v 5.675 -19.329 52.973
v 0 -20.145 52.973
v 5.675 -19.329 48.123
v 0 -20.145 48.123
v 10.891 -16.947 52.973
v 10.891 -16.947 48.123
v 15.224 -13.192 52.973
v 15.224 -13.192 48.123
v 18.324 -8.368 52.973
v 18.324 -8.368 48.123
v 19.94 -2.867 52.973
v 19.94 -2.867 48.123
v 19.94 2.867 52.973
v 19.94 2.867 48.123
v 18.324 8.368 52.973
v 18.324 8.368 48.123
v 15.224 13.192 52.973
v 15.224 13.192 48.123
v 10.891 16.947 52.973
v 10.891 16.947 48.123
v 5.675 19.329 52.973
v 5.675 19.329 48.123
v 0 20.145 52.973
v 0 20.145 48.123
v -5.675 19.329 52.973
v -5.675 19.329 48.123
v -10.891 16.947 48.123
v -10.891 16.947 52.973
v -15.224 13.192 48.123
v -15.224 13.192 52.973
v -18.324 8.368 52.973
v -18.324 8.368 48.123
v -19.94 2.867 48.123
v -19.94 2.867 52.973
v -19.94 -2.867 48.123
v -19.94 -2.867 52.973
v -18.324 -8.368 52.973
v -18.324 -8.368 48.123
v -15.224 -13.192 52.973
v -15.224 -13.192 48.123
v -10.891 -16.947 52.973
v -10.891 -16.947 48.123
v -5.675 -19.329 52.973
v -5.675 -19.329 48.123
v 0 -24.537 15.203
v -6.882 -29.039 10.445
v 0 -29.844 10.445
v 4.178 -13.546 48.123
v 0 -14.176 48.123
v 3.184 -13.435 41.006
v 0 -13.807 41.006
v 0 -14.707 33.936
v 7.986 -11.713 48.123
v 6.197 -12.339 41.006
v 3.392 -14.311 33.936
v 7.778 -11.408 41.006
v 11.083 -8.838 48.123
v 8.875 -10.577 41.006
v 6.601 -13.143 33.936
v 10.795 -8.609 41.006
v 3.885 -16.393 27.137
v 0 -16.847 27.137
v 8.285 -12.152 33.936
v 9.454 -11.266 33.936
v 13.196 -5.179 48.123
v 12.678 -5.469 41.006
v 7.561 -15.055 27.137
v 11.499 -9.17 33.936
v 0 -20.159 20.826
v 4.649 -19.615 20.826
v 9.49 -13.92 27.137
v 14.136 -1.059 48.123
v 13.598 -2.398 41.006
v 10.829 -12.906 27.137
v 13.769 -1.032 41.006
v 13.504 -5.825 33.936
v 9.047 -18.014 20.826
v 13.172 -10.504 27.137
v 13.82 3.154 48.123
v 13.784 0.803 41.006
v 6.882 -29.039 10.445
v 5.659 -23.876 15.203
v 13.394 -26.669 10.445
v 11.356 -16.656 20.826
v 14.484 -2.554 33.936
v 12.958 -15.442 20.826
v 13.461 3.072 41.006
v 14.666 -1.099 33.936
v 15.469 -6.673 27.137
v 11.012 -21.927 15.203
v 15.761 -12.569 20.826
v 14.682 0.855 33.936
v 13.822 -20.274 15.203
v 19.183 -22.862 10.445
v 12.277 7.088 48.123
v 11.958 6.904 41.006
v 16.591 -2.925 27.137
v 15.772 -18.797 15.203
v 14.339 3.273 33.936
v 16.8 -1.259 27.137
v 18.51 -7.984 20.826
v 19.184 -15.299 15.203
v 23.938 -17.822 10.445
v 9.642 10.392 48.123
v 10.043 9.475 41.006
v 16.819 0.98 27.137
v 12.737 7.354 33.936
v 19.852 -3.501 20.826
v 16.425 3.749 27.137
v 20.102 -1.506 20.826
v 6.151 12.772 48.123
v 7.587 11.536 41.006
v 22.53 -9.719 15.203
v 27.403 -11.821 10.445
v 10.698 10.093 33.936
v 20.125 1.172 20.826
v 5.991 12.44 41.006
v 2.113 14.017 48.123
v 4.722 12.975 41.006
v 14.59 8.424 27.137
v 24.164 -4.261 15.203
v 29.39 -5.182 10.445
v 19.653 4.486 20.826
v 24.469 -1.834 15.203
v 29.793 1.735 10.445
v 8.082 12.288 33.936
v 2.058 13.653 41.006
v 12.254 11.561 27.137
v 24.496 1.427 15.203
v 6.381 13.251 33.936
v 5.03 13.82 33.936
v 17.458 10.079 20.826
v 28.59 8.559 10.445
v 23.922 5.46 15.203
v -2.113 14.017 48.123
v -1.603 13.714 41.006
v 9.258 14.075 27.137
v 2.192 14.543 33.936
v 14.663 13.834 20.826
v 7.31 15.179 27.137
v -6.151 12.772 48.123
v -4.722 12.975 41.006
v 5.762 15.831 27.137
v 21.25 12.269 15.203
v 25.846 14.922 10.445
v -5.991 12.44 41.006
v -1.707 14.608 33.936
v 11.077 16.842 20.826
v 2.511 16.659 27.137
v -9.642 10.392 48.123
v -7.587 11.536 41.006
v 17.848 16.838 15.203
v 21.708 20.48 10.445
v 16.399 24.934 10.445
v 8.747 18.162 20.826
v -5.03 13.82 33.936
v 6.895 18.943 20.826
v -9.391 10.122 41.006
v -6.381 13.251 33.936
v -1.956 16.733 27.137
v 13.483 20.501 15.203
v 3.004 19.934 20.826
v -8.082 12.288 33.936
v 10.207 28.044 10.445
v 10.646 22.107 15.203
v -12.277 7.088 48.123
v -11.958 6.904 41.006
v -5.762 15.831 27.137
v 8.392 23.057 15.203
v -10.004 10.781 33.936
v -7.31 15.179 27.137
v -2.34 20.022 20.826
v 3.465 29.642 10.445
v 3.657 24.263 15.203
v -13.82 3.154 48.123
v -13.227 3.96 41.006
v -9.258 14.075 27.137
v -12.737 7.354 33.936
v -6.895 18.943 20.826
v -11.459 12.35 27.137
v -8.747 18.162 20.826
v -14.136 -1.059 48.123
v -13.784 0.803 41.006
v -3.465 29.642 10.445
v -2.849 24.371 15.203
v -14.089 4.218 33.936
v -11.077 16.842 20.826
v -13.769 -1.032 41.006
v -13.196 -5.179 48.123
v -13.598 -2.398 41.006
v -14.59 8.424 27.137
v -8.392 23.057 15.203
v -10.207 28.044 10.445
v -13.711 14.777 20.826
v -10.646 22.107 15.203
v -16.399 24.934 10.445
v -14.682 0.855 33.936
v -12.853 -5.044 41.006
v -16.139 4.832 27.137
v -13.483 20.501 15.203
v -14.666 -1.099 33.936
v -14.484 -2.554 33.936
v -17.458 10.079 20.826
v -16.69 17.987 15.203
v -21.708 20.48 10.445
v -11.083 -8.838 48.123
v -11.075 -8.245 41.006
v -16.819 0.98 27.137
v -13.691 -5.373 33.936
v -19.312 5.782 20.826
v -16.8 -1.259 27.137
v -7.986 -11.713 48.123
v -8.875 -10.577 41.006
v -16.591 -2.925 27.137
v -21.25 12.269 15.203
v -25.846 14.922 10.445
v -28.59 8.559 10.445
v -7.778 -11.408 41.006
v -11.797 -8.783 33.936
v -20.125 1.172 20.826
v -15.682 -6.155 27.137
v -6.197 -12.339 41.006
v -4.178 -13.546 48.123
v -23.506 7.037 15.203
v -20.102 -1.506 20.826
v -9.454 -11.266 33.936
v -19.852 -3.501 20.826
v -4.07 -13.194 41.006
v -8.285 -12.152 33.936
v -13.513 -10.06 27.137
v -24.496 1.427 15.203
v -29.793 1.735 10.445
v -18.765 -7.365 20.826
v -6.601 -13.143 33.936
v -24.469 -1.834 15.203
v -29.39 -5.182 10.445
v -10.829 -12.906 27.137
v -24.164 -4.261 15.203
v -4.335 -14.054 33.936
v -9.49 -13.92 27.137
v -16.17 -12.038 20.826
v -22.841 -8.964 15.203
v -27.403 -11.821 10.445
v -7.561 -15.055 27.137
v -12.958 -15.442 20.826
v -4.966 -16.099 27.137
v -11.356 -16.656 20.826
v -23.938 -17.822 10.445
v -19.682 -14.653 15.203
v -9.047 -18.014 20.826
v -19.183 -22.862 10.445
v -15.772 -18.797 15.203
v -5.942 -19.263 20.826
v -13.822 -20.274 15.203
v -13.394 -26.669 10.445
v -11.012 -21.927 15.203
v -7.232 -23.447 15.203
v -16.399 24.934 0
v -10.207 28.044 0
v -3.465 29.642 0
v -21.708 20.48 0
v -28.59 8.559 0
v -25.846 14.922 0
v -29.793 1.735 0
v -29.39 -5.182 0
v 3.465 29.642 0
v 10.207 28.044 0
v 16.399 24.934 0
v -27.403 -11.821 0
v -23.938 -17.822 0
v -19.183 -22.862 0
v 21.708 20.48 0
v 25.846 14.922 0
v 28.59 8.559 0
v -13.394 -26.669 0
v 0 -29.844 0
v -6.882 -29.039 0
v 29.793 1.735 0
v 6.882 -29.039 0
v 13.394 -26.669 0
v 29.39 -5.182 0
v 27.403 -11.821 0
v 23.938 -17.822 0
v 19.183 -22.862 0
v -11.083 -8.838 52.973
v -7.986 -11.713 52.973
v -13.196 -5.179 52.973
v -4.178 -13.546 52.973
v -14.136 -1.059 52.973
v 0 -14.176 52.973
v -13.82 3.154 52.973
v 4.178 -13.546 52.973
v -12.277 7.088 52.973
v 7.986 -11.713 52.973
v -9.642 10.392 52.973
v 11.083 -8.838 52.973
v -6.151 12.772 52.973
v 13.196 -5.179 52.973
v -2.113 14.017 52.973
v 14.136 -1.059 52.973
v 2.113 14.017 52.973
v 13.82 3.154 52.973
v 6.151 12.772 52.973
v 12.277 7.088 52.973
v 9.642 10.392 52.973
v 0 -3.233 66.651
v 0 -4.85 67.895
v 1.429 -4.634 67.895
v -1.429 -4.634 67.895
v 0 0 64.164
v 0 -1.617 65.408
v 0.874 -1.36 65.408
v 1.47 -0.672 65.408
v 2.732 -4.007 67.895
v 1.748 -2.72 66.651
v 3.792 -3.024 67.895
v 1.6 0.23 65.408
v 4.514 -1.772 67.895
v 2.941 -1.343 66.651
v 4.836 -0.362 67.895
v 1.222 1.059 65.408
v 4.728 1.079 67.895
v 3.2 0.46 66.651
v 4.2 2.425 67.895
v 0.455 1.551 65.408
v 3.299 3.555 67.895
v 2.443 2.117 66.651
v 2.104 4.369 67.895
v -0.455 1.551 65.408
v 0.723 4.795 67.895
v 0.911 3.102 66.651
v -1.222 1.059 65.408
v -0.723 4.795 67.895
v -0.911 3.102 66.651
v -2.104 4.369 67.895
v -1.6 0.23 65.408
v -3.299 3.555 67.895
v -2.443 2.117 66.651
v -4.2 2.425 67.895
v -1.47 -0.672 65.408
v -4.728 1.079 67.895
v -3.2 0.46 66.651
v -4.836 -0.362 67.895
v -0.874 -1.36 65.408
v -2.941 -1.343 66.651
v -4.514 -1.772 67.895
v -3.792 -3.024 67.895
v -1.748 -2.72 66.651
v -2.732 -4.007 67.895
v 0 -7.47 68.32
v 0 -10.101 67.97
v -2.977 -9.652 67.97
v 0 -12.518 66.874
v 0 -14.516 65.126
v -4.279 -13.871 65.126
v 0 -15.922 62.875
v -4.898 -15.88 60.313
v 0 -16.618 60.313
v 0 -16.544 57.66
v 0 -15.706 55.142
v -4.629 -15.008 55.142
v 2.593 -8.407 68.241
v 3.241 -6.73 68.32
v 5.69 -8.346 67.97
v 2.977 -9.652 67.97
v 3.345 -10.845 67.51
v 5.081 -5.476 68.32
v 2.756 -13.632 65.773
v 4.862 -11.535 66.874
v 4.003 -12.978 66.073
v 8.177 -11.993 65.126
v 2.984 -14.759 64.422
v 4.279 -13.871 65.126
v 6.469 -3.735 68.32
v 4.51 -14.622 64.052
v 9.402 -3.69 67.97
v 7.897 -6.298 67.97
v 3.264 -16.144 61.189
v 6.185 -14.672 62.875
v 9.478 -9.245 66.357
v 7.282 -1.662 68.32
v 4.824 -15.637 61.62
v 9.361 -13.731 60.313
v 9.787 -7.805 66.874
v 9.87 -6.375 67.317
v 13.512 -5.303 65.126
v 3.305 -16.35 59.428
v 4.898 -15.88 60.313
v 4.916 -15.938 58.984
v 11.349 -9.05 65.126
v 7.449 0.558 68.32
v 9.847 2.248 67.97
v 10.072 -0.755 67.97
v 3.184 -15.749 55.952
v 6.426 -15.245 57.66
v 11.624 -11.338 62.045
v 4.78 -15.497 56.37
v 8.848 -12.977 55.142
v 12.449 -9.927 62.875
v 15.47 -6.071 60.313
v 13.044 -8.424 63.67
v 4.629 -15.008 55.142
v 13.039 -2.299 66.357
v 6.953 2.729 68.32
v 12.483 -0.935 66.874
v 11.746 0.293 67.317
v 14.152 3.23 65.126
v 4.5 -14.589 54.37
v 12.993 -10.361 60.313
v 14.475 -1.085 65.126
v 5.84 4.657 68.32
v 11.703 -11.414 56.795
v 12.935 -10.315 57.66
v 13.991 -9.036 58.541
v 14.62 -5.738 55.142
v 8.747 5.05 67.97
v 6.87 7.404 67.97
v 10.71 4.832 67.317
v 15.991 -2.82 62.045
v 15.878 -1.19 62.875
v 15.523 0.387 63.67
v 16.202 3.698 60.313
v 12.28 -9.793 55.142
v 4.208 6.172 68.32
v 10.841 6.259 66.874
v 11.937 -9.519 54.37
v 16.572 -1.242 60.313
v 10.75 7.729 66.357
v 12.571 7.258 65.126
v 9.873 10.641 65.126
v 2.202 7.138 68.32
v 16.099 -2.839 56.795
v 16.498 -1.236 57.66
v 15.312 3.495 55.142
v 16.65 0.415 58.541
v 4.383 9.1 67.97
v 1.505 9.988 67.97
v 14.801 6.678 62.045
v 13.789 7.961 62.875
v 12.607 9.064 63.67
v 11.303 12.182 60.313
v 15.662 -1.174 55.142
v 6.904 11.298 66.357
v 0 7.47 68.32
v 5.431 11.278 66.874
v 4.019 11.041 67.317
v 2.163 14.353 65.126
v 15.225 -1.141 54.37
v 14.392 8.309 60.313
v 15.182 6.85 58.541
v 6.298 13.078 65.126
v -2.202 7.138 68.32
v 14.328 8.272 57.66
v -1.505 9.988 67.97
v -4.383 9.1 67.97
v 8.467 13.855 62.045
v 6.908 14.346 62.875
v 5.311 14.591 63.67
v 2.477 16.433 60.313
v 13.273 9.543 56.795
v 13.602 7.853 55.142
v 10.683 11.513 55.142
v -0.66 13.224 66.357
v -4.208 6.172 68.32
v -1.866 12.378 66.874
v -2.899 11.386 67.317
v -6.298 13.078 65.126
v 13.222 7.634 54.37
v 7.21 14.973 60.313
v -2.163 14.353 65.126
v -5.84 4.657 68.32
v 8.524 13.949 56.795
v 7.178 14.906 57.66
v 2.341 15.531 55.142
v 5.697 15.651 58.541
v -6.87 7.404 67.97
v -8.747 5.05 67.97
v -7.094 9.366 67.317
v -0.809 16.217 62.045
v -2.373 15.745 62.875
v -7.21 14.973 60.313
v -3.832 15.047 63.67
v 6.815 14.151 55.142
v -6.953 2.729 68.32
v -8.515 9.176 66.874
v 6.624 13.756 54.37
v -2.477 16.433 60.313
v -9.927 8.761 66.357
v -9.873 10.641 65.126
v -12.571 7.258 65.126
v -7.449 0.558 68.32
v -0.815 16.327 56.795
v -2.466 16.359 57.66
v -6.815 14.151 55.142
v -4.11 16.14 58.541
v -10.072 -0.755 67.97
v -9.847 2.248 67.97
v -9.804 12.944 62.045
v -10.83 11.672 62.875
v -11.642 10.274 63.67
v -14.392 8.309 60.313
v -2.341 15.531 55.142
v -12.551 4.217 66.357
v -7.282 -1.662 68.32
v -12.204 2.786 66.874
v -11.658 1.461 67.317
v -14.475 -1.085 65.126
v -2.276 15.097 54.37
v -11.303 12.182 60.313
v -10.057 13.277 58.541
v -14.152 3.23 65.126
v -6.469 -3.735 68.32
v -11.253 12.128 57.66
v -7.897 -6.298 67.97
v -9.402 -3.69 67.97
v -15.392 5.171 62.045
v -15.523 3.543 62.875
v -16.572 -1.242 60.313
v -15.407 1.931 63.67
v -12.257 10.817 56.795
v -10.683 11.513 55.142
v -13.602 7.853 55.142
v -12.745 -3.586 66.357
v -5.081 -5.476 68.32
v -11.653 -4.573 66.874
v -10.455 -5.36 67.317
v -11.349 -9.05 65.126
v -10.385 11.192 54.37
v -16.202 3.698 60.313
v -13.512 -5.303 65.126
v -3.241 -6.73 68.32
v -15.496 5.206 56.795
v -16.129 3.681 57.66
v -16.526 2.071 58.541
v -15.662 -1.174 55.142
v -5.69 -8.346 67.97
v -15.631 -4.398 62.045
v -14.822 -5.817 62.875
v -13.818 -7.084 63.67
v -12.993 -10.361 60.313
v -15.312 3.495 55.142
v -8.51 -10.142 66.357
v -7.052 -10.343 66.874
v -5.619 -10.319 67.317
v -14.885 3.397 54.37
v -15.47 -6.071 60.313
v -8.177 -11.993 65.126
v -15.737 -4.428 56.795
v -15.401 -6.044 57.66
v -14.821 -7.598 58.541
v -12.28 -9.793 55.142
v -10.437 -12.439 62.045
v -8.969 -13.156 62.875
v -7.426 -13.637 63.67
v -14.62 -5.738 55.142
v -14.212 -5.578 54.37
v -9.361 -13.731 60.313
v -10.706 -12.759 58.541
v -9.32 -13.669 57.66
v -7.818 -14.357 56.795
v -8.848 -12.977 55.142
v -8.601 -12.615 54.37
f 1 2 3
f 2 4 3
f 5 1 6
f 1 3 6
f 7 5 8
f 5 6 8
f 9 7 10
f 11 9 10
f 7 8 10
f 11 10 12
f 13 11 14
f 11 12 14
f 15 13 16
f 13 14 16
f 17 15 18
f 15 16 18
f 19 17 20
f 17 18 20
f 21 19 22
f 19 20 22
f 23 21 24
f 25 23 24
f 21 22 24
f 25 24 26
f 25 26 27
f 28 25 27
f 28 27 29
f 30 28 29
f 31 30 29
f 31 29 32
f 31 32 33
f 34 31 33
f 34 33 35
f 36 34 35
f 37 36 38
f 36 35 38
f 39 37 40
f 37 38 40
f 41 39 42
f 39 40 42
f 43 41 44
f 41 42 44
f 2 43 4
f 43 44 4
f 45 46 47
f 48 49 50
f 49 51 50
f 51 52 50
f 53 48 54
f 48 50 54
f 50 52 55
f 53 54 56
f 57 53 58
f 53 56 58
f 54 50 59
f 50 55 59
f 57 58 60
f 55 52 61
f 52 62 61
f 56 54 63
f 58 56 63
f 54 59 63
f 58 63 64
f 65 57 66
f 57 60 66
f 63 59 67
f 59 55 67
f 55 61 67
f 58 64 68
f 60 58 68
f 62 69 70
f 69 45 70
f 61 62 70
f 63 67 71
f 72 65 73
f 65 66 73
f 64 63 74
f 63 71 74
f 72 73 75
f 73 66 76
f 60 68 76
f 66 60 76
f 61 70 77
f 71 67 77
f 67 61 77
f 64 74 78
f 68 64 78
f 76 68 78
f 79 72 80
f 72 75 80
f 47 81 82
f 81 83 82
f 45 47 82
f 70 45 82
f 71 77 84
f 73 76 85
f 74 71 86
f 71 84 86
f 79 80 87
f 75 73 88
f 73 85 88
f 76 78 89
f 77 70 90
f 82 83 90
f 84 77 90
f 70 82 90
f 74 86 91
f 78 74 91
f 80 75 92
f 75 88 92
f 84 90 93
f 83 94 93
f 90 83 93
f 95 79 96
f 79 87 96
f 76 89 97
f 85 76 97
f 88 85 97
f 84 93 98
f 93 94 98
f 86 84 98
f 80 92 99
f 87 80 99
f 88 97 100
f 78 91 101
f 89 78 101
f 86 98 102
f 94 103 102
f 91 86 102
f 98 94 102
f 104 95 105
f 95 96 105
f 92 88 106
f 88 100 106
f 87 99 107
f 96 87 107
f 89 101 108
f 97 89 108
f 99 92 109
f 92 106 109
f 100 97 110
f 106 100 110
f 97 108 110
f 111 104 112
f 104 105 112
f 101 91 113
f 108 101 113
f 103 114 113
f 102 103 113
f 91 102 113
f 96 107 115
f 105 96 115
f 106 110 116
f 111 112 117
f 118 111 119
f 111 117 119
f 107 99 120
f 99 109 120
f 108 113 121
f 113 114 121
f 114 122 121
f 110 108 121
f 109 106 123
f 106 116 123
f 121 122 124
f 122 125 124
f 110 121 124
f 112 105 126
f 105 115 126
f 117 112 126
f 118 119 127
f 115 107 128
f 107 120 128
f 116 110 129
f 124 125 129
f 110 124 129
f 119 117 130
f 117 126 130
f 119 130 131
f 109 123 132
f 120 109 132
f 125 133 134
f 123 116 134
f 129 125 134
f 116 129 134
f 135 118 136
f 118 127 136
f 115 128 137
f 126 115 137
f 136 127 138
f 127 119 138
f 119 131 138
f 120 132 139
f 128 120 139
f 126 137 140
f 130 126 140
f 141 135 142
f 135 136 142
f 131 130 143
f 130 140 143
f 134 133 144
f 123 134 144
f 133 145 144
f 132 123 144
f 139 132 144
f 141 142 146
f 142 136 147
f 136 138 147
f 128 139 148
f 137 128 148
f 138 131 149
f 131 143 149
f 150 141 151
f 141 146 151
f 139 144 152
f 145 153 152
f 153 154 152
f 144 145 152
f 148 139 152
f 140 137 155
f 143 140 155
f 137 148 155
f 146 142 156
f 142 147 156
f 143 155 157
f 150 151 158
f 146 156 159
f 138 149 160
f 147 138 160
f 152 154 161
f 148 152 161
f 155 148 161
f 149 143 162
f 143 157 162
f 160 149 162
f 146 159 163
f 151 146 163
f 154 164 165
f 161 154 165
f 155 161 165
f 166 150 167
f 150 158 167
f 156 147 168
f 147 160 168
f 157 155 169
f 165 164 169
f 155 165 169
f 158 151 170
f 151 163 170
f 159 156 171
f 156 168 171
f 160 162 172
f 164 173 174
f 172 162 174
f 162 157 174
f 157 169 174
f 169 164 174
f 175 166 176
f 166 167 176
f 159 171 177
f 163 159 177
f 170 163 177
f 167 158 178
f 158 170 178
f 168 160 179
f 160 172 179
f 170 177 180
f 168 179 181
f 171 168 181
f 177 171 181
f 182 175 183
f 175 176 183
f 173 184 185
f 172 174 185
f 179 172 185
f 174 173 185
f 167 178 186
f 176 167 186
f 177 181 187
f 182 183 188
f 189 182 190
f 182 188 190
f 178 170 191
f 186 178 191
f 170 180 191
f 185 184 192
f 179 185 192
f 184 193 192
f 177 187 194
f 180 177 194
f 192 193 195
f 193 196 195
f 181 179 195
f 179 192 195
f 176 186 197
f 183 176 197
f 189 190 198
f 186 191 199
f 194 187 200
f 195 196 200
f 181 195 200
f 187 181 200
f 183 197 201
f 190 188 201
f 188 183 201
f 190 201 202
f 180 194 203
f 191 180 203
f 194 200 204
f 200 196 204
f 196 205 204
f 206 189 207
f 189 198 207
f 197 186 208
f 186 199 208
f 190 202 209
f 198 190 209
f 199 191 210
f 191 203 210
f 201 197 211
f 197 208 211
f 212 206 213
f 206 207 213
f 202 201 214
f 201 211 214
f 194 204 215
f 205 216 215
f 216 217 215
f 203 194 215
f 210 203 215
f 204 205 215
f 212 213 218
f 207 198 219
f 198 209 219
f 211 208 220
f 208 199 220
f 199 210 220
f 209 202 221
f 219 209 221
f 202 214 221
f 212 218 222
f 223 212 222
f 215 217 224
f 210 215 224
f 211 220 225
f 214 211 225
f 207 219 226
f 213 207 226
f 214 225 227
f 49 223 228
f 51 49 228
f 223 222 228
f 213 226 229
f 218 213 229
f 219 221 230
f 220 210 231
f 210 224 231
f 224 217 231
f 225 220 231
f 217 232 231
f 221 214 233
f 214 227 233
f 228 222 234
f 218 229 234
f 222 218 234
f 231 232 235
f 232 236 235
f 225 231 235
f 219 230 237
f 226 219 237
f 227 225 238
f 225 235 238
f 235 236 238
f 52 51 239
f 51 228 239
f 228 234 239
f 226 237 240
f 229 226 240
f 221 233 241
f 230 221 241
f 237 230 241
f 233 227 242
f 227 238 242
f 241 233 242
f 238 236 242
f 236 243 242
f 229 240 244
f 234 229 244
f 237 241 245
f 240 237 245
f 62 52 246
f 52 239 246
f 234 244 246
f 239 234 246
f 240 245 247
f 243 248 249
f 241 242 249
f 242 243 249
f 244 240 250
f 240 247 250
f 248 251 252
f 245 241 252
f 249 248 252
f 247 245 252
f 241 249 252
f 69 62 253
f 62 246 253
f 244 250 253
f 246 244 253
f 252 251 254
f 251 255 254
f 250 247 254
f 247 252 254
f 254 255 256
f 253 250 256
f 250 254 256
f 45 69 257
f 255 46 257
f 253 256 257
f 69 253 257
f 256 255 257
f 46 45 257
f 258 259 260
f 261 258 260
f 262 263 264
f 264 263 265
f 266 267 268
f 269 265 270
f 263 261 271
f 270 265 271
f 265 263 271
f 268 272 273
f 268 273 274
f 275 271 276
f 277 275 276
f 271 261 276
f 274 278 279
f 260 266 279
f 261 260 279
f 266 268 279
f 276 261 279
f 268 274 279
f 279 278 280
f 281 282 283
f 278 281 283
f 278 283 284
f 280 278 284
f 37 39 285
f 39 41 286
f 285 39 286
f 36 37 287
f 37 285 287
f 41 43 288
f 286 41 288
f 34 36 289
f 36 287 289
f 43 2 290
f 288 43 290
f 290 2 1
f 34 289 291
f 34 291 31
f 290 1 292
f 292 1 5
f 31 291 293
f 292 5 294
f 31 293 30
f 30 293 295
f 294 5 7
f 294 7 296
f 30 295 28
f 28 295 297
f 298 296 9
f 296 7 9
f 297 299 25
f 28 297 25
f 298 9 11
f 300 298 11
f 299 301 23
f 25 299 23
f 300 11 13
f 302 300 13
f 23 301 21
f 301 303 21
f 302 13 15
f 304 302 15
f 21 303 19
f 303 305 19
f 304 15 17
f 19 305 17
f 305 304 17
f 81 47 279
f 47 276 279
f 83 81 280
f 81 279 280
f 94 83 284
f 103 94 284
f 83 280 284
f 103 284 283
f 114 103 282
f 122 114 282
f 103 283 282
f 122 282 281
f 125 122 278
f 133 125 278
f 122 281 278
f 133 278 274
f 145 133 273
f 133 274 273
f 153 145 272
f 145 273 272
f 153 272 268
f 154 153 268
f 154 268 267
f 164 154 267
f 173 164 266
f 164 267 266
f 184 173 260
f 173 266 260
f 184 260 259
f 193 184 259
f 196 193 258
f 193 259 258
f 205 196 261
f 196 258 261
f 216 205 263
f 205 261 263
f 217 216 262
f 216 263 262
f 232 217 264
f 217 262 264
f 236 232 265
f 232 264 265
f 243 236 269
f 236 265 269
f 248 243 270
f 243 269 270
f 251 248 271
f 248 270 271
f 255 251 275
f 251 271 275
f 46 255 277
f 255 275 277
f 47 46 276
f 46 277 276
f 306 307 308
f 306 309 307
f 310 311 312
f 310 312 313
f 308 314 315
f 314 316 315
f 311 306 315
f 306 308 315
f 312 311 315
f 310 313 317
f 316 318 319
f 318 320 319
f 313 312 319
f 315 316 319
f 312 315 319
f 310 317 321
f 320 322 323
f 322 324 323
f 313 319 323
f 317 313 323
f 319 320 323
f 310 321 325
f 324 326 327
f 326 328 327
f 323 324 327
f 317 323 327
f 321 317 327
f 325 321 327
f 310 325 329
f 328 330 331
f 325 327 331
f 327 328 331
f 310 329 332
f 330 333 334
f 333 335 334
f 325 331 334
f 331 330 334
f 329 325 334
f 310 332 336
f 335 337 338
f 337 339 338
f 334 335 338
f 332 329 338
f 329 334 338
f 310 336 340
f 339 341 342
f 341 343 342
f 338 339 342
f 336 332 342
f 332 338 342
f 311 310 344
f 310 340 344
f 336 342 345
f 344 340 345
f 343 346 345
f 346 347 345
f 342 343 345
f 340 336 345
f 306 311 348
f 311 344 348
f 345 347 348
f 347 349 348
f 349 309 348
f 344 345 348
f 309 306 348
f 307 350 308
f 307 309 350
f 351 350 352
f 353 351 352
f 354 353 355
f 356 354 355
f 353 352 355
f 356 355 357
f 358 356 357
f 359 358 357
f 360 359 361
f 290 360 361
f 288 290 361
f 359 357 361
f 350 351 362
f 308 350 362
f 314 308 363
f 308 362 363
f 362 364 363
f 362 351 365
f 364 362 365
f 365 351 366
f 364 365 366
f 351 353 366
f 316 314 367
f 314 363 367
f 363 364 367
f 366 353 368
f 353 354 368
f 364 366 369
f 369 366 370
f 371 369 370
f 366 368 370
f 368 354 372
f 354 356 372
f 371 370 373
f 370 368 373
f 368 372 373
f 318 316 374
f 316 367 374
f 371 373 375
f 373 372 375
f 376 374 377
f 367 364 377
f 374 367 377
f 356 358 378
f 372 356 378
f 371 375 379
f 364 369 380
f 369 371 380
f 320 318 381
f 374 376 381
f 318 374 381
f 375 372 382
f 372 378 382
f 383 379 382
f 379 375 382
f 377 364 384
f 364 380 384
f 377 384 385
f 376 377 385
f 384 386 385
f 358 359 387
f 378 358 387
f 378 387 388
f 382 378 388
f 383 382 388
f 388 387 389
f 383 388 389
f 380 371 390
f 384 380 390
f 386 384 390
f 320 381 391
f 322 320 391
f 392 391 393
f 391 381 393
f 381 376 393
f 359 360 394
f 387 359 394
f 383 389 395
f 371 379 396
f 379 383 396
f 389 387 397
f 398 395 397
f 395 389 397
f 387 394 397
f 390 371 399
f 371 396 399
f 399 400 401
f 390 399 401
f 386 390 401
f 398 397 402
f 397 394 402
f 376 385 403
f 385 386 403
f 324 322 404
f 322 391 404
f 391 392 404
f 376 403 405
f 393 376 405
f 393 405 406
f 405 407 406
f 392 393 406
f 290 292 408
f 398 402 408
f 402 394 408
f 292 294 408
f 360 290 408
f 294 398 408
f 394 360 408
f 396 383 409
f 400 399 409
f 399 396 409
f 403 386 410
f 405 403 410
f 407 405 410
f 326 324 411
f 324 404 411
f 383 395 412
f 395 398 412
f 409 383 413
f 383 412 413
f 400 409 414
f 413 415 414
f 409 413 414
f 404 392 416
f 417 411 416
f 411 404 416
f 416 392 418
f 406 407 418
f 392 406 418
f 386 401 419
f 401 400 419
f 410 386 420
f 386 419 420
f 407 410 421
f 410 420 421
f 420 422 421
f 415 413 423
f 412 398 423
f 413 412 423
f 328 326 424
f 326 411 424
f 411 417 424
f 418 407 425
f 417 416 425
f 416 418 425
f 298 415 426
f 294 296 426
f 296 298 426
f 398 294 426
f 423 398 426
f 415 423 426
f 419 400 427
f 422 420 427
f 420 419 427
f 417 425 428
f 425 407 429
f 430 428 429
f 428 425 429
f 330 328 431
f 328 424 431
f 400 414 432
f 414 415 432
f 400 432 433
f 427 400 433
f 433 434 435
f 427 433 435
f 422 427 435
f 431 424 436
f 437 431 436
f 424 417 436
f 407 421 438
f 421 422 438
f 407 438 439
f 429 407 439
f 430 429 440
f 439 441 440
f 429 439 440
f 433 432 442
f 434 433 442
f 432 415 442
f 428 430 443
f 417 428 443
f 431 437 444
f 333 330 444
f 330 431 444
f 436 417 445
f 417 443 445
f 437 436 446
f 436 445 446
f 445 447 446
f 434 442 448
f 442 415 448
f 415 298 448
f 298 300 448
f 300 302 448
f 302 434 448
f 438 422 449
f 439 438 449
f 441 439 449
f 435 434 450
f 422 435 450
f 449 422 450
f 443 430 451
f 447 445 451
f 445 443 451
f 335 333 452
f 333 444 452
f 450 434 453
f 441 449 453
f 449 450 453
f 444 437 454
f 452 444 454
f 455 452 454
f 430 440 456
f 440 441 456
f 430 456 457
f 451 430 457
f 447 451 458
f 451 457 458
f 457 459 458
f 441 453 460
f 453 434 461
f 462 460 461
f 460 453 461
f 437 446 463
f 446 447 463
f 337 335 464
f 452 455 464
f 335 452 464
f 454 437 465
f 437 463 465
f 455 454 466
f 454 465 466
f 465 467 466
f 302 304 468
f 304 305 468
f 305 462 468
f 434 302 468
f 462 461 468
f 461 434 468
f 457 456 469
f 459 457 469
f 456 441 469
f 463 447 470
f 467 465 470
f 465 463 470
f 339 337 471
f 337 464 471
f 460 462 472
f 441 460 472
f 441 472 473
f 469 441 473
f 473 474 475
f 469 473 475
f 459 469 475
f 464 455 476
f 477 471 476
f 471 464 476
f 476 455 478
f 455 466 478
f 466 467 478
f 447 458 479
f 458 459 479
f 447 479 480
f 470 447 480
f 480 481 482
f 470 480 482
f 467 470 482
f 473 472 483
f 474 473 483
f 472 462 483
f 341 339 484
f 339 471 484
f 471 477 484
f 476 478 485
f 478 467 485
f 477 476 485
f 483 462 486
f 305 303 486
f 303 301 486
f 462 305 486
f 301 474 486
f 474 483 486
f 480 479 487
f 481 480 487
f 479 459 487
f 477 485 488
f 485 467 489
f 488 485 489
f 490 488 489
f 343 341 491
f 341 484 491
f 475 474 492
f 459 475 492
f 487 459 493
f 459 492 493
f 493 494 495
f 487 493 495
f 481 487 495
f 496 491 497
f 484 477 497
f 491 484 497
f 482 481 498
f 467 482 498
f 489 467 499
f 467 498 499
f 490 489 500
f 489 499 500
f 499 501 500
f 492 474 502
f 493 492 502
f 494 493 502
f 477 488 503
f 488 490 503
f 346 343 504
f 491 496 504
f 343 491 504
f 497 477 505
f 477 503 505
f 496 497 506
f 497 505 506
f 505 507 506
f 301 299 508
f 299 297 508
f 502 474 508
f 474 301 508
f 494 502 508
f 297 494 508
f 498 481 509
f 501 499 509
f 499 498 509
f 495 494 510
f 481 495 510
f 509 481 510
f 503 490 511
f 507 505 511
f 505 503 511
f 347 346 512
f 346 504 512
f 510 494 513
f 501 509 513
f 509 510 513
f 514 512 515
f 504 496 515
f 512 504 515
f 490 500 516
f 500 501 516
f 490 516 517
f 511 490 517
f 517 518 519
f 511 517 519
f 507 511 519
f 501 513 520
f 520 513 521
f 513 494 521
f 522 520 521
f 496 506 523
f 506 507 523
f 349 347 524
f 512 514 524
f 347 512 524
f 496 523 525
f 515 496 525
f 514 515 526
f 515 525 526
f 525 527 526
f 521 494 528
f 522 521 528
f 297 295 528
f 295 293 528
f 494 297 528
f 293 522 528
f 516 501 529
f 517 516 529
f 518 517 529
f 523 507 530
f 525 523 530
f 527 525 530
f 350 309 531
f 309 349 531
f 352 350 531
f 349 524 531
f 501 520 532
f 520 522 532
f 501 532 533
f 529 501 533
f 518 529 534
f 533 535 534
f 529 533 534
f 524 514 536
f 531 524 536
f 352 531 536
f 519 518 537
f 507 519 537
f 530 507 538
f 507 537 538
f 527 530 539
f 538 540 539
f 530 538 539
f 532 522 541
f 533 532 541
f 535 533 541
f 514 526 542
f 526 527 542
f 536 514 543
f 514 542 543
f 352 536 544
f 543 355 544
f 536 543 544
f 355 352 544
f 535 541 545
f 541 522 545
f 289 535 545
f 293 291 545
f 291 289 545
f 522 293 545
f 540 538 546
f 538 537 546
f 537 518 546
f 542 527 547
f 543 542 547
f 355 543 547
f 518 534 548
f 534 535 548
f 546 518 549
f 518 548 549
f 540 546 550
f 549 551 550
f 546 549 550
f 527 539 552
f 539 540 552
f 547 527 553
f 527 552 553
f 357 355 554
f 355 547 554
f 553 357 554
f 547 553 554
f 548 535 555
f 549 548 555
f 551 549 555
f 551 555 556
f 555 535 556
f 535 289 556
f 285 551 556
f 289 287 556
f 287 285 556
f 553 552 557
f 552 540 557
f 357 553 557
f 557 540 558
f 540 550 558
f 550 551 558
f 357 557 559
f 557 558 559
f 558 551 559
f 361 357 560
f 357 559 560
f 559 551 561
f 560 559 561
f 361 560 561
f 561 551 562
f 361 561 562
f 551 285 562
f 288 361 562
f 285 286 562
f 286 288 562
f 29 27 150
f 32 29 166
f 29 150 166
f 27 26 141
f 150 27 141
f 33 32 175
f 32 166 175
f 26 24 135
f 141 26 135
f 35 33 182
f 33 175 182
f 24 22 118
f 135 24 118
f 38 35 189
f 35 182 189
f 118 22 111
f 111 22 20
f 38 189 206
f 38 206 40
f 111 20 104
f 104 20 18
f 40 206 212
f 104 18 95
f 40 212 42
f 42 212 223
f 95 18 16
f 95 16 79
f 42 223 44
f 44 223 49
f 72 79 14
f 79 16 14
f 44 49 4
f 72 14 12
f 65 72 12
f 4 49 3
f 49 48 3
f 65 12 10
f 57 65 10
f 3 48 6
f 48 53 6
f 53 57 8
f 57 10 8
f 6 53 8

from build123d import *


with BuildPart() as f1:
    # F0 (on Right) → F1 (revolve)
    with BuildSketch(Plane.YZ):
        with BuildLine():
            Line((-29.843854, 0), (0, 0))
            Line((0, 0), (0, 64.164288))
            Line((0, 64.164288), (-4.849625, 67.894772))
            ThreePointArc((-4.849625, 67.894772), (-15.301636, 64.051876), (-14.175827, 52.972846))
            Line((-14.175827, 52.972846), (-20.144602, 52.972846))
            Line((-20.144602, 52.972846), (-20.144602, 48.123218))
            Line((-20.144602, 48.123218), (-14.175827, 48.123218))
            ThreePointArc((-14.175827, 48.123218), (-16.847024, 27.13737), (-29.843854, 10.445351))
            Line((-29.843854, 10.445351), (-29.843854, 0))
        make_face()
    revolve(axis=Axis((0, 0, 32.082144), (0, 0, 1)))


solid = f1.part
